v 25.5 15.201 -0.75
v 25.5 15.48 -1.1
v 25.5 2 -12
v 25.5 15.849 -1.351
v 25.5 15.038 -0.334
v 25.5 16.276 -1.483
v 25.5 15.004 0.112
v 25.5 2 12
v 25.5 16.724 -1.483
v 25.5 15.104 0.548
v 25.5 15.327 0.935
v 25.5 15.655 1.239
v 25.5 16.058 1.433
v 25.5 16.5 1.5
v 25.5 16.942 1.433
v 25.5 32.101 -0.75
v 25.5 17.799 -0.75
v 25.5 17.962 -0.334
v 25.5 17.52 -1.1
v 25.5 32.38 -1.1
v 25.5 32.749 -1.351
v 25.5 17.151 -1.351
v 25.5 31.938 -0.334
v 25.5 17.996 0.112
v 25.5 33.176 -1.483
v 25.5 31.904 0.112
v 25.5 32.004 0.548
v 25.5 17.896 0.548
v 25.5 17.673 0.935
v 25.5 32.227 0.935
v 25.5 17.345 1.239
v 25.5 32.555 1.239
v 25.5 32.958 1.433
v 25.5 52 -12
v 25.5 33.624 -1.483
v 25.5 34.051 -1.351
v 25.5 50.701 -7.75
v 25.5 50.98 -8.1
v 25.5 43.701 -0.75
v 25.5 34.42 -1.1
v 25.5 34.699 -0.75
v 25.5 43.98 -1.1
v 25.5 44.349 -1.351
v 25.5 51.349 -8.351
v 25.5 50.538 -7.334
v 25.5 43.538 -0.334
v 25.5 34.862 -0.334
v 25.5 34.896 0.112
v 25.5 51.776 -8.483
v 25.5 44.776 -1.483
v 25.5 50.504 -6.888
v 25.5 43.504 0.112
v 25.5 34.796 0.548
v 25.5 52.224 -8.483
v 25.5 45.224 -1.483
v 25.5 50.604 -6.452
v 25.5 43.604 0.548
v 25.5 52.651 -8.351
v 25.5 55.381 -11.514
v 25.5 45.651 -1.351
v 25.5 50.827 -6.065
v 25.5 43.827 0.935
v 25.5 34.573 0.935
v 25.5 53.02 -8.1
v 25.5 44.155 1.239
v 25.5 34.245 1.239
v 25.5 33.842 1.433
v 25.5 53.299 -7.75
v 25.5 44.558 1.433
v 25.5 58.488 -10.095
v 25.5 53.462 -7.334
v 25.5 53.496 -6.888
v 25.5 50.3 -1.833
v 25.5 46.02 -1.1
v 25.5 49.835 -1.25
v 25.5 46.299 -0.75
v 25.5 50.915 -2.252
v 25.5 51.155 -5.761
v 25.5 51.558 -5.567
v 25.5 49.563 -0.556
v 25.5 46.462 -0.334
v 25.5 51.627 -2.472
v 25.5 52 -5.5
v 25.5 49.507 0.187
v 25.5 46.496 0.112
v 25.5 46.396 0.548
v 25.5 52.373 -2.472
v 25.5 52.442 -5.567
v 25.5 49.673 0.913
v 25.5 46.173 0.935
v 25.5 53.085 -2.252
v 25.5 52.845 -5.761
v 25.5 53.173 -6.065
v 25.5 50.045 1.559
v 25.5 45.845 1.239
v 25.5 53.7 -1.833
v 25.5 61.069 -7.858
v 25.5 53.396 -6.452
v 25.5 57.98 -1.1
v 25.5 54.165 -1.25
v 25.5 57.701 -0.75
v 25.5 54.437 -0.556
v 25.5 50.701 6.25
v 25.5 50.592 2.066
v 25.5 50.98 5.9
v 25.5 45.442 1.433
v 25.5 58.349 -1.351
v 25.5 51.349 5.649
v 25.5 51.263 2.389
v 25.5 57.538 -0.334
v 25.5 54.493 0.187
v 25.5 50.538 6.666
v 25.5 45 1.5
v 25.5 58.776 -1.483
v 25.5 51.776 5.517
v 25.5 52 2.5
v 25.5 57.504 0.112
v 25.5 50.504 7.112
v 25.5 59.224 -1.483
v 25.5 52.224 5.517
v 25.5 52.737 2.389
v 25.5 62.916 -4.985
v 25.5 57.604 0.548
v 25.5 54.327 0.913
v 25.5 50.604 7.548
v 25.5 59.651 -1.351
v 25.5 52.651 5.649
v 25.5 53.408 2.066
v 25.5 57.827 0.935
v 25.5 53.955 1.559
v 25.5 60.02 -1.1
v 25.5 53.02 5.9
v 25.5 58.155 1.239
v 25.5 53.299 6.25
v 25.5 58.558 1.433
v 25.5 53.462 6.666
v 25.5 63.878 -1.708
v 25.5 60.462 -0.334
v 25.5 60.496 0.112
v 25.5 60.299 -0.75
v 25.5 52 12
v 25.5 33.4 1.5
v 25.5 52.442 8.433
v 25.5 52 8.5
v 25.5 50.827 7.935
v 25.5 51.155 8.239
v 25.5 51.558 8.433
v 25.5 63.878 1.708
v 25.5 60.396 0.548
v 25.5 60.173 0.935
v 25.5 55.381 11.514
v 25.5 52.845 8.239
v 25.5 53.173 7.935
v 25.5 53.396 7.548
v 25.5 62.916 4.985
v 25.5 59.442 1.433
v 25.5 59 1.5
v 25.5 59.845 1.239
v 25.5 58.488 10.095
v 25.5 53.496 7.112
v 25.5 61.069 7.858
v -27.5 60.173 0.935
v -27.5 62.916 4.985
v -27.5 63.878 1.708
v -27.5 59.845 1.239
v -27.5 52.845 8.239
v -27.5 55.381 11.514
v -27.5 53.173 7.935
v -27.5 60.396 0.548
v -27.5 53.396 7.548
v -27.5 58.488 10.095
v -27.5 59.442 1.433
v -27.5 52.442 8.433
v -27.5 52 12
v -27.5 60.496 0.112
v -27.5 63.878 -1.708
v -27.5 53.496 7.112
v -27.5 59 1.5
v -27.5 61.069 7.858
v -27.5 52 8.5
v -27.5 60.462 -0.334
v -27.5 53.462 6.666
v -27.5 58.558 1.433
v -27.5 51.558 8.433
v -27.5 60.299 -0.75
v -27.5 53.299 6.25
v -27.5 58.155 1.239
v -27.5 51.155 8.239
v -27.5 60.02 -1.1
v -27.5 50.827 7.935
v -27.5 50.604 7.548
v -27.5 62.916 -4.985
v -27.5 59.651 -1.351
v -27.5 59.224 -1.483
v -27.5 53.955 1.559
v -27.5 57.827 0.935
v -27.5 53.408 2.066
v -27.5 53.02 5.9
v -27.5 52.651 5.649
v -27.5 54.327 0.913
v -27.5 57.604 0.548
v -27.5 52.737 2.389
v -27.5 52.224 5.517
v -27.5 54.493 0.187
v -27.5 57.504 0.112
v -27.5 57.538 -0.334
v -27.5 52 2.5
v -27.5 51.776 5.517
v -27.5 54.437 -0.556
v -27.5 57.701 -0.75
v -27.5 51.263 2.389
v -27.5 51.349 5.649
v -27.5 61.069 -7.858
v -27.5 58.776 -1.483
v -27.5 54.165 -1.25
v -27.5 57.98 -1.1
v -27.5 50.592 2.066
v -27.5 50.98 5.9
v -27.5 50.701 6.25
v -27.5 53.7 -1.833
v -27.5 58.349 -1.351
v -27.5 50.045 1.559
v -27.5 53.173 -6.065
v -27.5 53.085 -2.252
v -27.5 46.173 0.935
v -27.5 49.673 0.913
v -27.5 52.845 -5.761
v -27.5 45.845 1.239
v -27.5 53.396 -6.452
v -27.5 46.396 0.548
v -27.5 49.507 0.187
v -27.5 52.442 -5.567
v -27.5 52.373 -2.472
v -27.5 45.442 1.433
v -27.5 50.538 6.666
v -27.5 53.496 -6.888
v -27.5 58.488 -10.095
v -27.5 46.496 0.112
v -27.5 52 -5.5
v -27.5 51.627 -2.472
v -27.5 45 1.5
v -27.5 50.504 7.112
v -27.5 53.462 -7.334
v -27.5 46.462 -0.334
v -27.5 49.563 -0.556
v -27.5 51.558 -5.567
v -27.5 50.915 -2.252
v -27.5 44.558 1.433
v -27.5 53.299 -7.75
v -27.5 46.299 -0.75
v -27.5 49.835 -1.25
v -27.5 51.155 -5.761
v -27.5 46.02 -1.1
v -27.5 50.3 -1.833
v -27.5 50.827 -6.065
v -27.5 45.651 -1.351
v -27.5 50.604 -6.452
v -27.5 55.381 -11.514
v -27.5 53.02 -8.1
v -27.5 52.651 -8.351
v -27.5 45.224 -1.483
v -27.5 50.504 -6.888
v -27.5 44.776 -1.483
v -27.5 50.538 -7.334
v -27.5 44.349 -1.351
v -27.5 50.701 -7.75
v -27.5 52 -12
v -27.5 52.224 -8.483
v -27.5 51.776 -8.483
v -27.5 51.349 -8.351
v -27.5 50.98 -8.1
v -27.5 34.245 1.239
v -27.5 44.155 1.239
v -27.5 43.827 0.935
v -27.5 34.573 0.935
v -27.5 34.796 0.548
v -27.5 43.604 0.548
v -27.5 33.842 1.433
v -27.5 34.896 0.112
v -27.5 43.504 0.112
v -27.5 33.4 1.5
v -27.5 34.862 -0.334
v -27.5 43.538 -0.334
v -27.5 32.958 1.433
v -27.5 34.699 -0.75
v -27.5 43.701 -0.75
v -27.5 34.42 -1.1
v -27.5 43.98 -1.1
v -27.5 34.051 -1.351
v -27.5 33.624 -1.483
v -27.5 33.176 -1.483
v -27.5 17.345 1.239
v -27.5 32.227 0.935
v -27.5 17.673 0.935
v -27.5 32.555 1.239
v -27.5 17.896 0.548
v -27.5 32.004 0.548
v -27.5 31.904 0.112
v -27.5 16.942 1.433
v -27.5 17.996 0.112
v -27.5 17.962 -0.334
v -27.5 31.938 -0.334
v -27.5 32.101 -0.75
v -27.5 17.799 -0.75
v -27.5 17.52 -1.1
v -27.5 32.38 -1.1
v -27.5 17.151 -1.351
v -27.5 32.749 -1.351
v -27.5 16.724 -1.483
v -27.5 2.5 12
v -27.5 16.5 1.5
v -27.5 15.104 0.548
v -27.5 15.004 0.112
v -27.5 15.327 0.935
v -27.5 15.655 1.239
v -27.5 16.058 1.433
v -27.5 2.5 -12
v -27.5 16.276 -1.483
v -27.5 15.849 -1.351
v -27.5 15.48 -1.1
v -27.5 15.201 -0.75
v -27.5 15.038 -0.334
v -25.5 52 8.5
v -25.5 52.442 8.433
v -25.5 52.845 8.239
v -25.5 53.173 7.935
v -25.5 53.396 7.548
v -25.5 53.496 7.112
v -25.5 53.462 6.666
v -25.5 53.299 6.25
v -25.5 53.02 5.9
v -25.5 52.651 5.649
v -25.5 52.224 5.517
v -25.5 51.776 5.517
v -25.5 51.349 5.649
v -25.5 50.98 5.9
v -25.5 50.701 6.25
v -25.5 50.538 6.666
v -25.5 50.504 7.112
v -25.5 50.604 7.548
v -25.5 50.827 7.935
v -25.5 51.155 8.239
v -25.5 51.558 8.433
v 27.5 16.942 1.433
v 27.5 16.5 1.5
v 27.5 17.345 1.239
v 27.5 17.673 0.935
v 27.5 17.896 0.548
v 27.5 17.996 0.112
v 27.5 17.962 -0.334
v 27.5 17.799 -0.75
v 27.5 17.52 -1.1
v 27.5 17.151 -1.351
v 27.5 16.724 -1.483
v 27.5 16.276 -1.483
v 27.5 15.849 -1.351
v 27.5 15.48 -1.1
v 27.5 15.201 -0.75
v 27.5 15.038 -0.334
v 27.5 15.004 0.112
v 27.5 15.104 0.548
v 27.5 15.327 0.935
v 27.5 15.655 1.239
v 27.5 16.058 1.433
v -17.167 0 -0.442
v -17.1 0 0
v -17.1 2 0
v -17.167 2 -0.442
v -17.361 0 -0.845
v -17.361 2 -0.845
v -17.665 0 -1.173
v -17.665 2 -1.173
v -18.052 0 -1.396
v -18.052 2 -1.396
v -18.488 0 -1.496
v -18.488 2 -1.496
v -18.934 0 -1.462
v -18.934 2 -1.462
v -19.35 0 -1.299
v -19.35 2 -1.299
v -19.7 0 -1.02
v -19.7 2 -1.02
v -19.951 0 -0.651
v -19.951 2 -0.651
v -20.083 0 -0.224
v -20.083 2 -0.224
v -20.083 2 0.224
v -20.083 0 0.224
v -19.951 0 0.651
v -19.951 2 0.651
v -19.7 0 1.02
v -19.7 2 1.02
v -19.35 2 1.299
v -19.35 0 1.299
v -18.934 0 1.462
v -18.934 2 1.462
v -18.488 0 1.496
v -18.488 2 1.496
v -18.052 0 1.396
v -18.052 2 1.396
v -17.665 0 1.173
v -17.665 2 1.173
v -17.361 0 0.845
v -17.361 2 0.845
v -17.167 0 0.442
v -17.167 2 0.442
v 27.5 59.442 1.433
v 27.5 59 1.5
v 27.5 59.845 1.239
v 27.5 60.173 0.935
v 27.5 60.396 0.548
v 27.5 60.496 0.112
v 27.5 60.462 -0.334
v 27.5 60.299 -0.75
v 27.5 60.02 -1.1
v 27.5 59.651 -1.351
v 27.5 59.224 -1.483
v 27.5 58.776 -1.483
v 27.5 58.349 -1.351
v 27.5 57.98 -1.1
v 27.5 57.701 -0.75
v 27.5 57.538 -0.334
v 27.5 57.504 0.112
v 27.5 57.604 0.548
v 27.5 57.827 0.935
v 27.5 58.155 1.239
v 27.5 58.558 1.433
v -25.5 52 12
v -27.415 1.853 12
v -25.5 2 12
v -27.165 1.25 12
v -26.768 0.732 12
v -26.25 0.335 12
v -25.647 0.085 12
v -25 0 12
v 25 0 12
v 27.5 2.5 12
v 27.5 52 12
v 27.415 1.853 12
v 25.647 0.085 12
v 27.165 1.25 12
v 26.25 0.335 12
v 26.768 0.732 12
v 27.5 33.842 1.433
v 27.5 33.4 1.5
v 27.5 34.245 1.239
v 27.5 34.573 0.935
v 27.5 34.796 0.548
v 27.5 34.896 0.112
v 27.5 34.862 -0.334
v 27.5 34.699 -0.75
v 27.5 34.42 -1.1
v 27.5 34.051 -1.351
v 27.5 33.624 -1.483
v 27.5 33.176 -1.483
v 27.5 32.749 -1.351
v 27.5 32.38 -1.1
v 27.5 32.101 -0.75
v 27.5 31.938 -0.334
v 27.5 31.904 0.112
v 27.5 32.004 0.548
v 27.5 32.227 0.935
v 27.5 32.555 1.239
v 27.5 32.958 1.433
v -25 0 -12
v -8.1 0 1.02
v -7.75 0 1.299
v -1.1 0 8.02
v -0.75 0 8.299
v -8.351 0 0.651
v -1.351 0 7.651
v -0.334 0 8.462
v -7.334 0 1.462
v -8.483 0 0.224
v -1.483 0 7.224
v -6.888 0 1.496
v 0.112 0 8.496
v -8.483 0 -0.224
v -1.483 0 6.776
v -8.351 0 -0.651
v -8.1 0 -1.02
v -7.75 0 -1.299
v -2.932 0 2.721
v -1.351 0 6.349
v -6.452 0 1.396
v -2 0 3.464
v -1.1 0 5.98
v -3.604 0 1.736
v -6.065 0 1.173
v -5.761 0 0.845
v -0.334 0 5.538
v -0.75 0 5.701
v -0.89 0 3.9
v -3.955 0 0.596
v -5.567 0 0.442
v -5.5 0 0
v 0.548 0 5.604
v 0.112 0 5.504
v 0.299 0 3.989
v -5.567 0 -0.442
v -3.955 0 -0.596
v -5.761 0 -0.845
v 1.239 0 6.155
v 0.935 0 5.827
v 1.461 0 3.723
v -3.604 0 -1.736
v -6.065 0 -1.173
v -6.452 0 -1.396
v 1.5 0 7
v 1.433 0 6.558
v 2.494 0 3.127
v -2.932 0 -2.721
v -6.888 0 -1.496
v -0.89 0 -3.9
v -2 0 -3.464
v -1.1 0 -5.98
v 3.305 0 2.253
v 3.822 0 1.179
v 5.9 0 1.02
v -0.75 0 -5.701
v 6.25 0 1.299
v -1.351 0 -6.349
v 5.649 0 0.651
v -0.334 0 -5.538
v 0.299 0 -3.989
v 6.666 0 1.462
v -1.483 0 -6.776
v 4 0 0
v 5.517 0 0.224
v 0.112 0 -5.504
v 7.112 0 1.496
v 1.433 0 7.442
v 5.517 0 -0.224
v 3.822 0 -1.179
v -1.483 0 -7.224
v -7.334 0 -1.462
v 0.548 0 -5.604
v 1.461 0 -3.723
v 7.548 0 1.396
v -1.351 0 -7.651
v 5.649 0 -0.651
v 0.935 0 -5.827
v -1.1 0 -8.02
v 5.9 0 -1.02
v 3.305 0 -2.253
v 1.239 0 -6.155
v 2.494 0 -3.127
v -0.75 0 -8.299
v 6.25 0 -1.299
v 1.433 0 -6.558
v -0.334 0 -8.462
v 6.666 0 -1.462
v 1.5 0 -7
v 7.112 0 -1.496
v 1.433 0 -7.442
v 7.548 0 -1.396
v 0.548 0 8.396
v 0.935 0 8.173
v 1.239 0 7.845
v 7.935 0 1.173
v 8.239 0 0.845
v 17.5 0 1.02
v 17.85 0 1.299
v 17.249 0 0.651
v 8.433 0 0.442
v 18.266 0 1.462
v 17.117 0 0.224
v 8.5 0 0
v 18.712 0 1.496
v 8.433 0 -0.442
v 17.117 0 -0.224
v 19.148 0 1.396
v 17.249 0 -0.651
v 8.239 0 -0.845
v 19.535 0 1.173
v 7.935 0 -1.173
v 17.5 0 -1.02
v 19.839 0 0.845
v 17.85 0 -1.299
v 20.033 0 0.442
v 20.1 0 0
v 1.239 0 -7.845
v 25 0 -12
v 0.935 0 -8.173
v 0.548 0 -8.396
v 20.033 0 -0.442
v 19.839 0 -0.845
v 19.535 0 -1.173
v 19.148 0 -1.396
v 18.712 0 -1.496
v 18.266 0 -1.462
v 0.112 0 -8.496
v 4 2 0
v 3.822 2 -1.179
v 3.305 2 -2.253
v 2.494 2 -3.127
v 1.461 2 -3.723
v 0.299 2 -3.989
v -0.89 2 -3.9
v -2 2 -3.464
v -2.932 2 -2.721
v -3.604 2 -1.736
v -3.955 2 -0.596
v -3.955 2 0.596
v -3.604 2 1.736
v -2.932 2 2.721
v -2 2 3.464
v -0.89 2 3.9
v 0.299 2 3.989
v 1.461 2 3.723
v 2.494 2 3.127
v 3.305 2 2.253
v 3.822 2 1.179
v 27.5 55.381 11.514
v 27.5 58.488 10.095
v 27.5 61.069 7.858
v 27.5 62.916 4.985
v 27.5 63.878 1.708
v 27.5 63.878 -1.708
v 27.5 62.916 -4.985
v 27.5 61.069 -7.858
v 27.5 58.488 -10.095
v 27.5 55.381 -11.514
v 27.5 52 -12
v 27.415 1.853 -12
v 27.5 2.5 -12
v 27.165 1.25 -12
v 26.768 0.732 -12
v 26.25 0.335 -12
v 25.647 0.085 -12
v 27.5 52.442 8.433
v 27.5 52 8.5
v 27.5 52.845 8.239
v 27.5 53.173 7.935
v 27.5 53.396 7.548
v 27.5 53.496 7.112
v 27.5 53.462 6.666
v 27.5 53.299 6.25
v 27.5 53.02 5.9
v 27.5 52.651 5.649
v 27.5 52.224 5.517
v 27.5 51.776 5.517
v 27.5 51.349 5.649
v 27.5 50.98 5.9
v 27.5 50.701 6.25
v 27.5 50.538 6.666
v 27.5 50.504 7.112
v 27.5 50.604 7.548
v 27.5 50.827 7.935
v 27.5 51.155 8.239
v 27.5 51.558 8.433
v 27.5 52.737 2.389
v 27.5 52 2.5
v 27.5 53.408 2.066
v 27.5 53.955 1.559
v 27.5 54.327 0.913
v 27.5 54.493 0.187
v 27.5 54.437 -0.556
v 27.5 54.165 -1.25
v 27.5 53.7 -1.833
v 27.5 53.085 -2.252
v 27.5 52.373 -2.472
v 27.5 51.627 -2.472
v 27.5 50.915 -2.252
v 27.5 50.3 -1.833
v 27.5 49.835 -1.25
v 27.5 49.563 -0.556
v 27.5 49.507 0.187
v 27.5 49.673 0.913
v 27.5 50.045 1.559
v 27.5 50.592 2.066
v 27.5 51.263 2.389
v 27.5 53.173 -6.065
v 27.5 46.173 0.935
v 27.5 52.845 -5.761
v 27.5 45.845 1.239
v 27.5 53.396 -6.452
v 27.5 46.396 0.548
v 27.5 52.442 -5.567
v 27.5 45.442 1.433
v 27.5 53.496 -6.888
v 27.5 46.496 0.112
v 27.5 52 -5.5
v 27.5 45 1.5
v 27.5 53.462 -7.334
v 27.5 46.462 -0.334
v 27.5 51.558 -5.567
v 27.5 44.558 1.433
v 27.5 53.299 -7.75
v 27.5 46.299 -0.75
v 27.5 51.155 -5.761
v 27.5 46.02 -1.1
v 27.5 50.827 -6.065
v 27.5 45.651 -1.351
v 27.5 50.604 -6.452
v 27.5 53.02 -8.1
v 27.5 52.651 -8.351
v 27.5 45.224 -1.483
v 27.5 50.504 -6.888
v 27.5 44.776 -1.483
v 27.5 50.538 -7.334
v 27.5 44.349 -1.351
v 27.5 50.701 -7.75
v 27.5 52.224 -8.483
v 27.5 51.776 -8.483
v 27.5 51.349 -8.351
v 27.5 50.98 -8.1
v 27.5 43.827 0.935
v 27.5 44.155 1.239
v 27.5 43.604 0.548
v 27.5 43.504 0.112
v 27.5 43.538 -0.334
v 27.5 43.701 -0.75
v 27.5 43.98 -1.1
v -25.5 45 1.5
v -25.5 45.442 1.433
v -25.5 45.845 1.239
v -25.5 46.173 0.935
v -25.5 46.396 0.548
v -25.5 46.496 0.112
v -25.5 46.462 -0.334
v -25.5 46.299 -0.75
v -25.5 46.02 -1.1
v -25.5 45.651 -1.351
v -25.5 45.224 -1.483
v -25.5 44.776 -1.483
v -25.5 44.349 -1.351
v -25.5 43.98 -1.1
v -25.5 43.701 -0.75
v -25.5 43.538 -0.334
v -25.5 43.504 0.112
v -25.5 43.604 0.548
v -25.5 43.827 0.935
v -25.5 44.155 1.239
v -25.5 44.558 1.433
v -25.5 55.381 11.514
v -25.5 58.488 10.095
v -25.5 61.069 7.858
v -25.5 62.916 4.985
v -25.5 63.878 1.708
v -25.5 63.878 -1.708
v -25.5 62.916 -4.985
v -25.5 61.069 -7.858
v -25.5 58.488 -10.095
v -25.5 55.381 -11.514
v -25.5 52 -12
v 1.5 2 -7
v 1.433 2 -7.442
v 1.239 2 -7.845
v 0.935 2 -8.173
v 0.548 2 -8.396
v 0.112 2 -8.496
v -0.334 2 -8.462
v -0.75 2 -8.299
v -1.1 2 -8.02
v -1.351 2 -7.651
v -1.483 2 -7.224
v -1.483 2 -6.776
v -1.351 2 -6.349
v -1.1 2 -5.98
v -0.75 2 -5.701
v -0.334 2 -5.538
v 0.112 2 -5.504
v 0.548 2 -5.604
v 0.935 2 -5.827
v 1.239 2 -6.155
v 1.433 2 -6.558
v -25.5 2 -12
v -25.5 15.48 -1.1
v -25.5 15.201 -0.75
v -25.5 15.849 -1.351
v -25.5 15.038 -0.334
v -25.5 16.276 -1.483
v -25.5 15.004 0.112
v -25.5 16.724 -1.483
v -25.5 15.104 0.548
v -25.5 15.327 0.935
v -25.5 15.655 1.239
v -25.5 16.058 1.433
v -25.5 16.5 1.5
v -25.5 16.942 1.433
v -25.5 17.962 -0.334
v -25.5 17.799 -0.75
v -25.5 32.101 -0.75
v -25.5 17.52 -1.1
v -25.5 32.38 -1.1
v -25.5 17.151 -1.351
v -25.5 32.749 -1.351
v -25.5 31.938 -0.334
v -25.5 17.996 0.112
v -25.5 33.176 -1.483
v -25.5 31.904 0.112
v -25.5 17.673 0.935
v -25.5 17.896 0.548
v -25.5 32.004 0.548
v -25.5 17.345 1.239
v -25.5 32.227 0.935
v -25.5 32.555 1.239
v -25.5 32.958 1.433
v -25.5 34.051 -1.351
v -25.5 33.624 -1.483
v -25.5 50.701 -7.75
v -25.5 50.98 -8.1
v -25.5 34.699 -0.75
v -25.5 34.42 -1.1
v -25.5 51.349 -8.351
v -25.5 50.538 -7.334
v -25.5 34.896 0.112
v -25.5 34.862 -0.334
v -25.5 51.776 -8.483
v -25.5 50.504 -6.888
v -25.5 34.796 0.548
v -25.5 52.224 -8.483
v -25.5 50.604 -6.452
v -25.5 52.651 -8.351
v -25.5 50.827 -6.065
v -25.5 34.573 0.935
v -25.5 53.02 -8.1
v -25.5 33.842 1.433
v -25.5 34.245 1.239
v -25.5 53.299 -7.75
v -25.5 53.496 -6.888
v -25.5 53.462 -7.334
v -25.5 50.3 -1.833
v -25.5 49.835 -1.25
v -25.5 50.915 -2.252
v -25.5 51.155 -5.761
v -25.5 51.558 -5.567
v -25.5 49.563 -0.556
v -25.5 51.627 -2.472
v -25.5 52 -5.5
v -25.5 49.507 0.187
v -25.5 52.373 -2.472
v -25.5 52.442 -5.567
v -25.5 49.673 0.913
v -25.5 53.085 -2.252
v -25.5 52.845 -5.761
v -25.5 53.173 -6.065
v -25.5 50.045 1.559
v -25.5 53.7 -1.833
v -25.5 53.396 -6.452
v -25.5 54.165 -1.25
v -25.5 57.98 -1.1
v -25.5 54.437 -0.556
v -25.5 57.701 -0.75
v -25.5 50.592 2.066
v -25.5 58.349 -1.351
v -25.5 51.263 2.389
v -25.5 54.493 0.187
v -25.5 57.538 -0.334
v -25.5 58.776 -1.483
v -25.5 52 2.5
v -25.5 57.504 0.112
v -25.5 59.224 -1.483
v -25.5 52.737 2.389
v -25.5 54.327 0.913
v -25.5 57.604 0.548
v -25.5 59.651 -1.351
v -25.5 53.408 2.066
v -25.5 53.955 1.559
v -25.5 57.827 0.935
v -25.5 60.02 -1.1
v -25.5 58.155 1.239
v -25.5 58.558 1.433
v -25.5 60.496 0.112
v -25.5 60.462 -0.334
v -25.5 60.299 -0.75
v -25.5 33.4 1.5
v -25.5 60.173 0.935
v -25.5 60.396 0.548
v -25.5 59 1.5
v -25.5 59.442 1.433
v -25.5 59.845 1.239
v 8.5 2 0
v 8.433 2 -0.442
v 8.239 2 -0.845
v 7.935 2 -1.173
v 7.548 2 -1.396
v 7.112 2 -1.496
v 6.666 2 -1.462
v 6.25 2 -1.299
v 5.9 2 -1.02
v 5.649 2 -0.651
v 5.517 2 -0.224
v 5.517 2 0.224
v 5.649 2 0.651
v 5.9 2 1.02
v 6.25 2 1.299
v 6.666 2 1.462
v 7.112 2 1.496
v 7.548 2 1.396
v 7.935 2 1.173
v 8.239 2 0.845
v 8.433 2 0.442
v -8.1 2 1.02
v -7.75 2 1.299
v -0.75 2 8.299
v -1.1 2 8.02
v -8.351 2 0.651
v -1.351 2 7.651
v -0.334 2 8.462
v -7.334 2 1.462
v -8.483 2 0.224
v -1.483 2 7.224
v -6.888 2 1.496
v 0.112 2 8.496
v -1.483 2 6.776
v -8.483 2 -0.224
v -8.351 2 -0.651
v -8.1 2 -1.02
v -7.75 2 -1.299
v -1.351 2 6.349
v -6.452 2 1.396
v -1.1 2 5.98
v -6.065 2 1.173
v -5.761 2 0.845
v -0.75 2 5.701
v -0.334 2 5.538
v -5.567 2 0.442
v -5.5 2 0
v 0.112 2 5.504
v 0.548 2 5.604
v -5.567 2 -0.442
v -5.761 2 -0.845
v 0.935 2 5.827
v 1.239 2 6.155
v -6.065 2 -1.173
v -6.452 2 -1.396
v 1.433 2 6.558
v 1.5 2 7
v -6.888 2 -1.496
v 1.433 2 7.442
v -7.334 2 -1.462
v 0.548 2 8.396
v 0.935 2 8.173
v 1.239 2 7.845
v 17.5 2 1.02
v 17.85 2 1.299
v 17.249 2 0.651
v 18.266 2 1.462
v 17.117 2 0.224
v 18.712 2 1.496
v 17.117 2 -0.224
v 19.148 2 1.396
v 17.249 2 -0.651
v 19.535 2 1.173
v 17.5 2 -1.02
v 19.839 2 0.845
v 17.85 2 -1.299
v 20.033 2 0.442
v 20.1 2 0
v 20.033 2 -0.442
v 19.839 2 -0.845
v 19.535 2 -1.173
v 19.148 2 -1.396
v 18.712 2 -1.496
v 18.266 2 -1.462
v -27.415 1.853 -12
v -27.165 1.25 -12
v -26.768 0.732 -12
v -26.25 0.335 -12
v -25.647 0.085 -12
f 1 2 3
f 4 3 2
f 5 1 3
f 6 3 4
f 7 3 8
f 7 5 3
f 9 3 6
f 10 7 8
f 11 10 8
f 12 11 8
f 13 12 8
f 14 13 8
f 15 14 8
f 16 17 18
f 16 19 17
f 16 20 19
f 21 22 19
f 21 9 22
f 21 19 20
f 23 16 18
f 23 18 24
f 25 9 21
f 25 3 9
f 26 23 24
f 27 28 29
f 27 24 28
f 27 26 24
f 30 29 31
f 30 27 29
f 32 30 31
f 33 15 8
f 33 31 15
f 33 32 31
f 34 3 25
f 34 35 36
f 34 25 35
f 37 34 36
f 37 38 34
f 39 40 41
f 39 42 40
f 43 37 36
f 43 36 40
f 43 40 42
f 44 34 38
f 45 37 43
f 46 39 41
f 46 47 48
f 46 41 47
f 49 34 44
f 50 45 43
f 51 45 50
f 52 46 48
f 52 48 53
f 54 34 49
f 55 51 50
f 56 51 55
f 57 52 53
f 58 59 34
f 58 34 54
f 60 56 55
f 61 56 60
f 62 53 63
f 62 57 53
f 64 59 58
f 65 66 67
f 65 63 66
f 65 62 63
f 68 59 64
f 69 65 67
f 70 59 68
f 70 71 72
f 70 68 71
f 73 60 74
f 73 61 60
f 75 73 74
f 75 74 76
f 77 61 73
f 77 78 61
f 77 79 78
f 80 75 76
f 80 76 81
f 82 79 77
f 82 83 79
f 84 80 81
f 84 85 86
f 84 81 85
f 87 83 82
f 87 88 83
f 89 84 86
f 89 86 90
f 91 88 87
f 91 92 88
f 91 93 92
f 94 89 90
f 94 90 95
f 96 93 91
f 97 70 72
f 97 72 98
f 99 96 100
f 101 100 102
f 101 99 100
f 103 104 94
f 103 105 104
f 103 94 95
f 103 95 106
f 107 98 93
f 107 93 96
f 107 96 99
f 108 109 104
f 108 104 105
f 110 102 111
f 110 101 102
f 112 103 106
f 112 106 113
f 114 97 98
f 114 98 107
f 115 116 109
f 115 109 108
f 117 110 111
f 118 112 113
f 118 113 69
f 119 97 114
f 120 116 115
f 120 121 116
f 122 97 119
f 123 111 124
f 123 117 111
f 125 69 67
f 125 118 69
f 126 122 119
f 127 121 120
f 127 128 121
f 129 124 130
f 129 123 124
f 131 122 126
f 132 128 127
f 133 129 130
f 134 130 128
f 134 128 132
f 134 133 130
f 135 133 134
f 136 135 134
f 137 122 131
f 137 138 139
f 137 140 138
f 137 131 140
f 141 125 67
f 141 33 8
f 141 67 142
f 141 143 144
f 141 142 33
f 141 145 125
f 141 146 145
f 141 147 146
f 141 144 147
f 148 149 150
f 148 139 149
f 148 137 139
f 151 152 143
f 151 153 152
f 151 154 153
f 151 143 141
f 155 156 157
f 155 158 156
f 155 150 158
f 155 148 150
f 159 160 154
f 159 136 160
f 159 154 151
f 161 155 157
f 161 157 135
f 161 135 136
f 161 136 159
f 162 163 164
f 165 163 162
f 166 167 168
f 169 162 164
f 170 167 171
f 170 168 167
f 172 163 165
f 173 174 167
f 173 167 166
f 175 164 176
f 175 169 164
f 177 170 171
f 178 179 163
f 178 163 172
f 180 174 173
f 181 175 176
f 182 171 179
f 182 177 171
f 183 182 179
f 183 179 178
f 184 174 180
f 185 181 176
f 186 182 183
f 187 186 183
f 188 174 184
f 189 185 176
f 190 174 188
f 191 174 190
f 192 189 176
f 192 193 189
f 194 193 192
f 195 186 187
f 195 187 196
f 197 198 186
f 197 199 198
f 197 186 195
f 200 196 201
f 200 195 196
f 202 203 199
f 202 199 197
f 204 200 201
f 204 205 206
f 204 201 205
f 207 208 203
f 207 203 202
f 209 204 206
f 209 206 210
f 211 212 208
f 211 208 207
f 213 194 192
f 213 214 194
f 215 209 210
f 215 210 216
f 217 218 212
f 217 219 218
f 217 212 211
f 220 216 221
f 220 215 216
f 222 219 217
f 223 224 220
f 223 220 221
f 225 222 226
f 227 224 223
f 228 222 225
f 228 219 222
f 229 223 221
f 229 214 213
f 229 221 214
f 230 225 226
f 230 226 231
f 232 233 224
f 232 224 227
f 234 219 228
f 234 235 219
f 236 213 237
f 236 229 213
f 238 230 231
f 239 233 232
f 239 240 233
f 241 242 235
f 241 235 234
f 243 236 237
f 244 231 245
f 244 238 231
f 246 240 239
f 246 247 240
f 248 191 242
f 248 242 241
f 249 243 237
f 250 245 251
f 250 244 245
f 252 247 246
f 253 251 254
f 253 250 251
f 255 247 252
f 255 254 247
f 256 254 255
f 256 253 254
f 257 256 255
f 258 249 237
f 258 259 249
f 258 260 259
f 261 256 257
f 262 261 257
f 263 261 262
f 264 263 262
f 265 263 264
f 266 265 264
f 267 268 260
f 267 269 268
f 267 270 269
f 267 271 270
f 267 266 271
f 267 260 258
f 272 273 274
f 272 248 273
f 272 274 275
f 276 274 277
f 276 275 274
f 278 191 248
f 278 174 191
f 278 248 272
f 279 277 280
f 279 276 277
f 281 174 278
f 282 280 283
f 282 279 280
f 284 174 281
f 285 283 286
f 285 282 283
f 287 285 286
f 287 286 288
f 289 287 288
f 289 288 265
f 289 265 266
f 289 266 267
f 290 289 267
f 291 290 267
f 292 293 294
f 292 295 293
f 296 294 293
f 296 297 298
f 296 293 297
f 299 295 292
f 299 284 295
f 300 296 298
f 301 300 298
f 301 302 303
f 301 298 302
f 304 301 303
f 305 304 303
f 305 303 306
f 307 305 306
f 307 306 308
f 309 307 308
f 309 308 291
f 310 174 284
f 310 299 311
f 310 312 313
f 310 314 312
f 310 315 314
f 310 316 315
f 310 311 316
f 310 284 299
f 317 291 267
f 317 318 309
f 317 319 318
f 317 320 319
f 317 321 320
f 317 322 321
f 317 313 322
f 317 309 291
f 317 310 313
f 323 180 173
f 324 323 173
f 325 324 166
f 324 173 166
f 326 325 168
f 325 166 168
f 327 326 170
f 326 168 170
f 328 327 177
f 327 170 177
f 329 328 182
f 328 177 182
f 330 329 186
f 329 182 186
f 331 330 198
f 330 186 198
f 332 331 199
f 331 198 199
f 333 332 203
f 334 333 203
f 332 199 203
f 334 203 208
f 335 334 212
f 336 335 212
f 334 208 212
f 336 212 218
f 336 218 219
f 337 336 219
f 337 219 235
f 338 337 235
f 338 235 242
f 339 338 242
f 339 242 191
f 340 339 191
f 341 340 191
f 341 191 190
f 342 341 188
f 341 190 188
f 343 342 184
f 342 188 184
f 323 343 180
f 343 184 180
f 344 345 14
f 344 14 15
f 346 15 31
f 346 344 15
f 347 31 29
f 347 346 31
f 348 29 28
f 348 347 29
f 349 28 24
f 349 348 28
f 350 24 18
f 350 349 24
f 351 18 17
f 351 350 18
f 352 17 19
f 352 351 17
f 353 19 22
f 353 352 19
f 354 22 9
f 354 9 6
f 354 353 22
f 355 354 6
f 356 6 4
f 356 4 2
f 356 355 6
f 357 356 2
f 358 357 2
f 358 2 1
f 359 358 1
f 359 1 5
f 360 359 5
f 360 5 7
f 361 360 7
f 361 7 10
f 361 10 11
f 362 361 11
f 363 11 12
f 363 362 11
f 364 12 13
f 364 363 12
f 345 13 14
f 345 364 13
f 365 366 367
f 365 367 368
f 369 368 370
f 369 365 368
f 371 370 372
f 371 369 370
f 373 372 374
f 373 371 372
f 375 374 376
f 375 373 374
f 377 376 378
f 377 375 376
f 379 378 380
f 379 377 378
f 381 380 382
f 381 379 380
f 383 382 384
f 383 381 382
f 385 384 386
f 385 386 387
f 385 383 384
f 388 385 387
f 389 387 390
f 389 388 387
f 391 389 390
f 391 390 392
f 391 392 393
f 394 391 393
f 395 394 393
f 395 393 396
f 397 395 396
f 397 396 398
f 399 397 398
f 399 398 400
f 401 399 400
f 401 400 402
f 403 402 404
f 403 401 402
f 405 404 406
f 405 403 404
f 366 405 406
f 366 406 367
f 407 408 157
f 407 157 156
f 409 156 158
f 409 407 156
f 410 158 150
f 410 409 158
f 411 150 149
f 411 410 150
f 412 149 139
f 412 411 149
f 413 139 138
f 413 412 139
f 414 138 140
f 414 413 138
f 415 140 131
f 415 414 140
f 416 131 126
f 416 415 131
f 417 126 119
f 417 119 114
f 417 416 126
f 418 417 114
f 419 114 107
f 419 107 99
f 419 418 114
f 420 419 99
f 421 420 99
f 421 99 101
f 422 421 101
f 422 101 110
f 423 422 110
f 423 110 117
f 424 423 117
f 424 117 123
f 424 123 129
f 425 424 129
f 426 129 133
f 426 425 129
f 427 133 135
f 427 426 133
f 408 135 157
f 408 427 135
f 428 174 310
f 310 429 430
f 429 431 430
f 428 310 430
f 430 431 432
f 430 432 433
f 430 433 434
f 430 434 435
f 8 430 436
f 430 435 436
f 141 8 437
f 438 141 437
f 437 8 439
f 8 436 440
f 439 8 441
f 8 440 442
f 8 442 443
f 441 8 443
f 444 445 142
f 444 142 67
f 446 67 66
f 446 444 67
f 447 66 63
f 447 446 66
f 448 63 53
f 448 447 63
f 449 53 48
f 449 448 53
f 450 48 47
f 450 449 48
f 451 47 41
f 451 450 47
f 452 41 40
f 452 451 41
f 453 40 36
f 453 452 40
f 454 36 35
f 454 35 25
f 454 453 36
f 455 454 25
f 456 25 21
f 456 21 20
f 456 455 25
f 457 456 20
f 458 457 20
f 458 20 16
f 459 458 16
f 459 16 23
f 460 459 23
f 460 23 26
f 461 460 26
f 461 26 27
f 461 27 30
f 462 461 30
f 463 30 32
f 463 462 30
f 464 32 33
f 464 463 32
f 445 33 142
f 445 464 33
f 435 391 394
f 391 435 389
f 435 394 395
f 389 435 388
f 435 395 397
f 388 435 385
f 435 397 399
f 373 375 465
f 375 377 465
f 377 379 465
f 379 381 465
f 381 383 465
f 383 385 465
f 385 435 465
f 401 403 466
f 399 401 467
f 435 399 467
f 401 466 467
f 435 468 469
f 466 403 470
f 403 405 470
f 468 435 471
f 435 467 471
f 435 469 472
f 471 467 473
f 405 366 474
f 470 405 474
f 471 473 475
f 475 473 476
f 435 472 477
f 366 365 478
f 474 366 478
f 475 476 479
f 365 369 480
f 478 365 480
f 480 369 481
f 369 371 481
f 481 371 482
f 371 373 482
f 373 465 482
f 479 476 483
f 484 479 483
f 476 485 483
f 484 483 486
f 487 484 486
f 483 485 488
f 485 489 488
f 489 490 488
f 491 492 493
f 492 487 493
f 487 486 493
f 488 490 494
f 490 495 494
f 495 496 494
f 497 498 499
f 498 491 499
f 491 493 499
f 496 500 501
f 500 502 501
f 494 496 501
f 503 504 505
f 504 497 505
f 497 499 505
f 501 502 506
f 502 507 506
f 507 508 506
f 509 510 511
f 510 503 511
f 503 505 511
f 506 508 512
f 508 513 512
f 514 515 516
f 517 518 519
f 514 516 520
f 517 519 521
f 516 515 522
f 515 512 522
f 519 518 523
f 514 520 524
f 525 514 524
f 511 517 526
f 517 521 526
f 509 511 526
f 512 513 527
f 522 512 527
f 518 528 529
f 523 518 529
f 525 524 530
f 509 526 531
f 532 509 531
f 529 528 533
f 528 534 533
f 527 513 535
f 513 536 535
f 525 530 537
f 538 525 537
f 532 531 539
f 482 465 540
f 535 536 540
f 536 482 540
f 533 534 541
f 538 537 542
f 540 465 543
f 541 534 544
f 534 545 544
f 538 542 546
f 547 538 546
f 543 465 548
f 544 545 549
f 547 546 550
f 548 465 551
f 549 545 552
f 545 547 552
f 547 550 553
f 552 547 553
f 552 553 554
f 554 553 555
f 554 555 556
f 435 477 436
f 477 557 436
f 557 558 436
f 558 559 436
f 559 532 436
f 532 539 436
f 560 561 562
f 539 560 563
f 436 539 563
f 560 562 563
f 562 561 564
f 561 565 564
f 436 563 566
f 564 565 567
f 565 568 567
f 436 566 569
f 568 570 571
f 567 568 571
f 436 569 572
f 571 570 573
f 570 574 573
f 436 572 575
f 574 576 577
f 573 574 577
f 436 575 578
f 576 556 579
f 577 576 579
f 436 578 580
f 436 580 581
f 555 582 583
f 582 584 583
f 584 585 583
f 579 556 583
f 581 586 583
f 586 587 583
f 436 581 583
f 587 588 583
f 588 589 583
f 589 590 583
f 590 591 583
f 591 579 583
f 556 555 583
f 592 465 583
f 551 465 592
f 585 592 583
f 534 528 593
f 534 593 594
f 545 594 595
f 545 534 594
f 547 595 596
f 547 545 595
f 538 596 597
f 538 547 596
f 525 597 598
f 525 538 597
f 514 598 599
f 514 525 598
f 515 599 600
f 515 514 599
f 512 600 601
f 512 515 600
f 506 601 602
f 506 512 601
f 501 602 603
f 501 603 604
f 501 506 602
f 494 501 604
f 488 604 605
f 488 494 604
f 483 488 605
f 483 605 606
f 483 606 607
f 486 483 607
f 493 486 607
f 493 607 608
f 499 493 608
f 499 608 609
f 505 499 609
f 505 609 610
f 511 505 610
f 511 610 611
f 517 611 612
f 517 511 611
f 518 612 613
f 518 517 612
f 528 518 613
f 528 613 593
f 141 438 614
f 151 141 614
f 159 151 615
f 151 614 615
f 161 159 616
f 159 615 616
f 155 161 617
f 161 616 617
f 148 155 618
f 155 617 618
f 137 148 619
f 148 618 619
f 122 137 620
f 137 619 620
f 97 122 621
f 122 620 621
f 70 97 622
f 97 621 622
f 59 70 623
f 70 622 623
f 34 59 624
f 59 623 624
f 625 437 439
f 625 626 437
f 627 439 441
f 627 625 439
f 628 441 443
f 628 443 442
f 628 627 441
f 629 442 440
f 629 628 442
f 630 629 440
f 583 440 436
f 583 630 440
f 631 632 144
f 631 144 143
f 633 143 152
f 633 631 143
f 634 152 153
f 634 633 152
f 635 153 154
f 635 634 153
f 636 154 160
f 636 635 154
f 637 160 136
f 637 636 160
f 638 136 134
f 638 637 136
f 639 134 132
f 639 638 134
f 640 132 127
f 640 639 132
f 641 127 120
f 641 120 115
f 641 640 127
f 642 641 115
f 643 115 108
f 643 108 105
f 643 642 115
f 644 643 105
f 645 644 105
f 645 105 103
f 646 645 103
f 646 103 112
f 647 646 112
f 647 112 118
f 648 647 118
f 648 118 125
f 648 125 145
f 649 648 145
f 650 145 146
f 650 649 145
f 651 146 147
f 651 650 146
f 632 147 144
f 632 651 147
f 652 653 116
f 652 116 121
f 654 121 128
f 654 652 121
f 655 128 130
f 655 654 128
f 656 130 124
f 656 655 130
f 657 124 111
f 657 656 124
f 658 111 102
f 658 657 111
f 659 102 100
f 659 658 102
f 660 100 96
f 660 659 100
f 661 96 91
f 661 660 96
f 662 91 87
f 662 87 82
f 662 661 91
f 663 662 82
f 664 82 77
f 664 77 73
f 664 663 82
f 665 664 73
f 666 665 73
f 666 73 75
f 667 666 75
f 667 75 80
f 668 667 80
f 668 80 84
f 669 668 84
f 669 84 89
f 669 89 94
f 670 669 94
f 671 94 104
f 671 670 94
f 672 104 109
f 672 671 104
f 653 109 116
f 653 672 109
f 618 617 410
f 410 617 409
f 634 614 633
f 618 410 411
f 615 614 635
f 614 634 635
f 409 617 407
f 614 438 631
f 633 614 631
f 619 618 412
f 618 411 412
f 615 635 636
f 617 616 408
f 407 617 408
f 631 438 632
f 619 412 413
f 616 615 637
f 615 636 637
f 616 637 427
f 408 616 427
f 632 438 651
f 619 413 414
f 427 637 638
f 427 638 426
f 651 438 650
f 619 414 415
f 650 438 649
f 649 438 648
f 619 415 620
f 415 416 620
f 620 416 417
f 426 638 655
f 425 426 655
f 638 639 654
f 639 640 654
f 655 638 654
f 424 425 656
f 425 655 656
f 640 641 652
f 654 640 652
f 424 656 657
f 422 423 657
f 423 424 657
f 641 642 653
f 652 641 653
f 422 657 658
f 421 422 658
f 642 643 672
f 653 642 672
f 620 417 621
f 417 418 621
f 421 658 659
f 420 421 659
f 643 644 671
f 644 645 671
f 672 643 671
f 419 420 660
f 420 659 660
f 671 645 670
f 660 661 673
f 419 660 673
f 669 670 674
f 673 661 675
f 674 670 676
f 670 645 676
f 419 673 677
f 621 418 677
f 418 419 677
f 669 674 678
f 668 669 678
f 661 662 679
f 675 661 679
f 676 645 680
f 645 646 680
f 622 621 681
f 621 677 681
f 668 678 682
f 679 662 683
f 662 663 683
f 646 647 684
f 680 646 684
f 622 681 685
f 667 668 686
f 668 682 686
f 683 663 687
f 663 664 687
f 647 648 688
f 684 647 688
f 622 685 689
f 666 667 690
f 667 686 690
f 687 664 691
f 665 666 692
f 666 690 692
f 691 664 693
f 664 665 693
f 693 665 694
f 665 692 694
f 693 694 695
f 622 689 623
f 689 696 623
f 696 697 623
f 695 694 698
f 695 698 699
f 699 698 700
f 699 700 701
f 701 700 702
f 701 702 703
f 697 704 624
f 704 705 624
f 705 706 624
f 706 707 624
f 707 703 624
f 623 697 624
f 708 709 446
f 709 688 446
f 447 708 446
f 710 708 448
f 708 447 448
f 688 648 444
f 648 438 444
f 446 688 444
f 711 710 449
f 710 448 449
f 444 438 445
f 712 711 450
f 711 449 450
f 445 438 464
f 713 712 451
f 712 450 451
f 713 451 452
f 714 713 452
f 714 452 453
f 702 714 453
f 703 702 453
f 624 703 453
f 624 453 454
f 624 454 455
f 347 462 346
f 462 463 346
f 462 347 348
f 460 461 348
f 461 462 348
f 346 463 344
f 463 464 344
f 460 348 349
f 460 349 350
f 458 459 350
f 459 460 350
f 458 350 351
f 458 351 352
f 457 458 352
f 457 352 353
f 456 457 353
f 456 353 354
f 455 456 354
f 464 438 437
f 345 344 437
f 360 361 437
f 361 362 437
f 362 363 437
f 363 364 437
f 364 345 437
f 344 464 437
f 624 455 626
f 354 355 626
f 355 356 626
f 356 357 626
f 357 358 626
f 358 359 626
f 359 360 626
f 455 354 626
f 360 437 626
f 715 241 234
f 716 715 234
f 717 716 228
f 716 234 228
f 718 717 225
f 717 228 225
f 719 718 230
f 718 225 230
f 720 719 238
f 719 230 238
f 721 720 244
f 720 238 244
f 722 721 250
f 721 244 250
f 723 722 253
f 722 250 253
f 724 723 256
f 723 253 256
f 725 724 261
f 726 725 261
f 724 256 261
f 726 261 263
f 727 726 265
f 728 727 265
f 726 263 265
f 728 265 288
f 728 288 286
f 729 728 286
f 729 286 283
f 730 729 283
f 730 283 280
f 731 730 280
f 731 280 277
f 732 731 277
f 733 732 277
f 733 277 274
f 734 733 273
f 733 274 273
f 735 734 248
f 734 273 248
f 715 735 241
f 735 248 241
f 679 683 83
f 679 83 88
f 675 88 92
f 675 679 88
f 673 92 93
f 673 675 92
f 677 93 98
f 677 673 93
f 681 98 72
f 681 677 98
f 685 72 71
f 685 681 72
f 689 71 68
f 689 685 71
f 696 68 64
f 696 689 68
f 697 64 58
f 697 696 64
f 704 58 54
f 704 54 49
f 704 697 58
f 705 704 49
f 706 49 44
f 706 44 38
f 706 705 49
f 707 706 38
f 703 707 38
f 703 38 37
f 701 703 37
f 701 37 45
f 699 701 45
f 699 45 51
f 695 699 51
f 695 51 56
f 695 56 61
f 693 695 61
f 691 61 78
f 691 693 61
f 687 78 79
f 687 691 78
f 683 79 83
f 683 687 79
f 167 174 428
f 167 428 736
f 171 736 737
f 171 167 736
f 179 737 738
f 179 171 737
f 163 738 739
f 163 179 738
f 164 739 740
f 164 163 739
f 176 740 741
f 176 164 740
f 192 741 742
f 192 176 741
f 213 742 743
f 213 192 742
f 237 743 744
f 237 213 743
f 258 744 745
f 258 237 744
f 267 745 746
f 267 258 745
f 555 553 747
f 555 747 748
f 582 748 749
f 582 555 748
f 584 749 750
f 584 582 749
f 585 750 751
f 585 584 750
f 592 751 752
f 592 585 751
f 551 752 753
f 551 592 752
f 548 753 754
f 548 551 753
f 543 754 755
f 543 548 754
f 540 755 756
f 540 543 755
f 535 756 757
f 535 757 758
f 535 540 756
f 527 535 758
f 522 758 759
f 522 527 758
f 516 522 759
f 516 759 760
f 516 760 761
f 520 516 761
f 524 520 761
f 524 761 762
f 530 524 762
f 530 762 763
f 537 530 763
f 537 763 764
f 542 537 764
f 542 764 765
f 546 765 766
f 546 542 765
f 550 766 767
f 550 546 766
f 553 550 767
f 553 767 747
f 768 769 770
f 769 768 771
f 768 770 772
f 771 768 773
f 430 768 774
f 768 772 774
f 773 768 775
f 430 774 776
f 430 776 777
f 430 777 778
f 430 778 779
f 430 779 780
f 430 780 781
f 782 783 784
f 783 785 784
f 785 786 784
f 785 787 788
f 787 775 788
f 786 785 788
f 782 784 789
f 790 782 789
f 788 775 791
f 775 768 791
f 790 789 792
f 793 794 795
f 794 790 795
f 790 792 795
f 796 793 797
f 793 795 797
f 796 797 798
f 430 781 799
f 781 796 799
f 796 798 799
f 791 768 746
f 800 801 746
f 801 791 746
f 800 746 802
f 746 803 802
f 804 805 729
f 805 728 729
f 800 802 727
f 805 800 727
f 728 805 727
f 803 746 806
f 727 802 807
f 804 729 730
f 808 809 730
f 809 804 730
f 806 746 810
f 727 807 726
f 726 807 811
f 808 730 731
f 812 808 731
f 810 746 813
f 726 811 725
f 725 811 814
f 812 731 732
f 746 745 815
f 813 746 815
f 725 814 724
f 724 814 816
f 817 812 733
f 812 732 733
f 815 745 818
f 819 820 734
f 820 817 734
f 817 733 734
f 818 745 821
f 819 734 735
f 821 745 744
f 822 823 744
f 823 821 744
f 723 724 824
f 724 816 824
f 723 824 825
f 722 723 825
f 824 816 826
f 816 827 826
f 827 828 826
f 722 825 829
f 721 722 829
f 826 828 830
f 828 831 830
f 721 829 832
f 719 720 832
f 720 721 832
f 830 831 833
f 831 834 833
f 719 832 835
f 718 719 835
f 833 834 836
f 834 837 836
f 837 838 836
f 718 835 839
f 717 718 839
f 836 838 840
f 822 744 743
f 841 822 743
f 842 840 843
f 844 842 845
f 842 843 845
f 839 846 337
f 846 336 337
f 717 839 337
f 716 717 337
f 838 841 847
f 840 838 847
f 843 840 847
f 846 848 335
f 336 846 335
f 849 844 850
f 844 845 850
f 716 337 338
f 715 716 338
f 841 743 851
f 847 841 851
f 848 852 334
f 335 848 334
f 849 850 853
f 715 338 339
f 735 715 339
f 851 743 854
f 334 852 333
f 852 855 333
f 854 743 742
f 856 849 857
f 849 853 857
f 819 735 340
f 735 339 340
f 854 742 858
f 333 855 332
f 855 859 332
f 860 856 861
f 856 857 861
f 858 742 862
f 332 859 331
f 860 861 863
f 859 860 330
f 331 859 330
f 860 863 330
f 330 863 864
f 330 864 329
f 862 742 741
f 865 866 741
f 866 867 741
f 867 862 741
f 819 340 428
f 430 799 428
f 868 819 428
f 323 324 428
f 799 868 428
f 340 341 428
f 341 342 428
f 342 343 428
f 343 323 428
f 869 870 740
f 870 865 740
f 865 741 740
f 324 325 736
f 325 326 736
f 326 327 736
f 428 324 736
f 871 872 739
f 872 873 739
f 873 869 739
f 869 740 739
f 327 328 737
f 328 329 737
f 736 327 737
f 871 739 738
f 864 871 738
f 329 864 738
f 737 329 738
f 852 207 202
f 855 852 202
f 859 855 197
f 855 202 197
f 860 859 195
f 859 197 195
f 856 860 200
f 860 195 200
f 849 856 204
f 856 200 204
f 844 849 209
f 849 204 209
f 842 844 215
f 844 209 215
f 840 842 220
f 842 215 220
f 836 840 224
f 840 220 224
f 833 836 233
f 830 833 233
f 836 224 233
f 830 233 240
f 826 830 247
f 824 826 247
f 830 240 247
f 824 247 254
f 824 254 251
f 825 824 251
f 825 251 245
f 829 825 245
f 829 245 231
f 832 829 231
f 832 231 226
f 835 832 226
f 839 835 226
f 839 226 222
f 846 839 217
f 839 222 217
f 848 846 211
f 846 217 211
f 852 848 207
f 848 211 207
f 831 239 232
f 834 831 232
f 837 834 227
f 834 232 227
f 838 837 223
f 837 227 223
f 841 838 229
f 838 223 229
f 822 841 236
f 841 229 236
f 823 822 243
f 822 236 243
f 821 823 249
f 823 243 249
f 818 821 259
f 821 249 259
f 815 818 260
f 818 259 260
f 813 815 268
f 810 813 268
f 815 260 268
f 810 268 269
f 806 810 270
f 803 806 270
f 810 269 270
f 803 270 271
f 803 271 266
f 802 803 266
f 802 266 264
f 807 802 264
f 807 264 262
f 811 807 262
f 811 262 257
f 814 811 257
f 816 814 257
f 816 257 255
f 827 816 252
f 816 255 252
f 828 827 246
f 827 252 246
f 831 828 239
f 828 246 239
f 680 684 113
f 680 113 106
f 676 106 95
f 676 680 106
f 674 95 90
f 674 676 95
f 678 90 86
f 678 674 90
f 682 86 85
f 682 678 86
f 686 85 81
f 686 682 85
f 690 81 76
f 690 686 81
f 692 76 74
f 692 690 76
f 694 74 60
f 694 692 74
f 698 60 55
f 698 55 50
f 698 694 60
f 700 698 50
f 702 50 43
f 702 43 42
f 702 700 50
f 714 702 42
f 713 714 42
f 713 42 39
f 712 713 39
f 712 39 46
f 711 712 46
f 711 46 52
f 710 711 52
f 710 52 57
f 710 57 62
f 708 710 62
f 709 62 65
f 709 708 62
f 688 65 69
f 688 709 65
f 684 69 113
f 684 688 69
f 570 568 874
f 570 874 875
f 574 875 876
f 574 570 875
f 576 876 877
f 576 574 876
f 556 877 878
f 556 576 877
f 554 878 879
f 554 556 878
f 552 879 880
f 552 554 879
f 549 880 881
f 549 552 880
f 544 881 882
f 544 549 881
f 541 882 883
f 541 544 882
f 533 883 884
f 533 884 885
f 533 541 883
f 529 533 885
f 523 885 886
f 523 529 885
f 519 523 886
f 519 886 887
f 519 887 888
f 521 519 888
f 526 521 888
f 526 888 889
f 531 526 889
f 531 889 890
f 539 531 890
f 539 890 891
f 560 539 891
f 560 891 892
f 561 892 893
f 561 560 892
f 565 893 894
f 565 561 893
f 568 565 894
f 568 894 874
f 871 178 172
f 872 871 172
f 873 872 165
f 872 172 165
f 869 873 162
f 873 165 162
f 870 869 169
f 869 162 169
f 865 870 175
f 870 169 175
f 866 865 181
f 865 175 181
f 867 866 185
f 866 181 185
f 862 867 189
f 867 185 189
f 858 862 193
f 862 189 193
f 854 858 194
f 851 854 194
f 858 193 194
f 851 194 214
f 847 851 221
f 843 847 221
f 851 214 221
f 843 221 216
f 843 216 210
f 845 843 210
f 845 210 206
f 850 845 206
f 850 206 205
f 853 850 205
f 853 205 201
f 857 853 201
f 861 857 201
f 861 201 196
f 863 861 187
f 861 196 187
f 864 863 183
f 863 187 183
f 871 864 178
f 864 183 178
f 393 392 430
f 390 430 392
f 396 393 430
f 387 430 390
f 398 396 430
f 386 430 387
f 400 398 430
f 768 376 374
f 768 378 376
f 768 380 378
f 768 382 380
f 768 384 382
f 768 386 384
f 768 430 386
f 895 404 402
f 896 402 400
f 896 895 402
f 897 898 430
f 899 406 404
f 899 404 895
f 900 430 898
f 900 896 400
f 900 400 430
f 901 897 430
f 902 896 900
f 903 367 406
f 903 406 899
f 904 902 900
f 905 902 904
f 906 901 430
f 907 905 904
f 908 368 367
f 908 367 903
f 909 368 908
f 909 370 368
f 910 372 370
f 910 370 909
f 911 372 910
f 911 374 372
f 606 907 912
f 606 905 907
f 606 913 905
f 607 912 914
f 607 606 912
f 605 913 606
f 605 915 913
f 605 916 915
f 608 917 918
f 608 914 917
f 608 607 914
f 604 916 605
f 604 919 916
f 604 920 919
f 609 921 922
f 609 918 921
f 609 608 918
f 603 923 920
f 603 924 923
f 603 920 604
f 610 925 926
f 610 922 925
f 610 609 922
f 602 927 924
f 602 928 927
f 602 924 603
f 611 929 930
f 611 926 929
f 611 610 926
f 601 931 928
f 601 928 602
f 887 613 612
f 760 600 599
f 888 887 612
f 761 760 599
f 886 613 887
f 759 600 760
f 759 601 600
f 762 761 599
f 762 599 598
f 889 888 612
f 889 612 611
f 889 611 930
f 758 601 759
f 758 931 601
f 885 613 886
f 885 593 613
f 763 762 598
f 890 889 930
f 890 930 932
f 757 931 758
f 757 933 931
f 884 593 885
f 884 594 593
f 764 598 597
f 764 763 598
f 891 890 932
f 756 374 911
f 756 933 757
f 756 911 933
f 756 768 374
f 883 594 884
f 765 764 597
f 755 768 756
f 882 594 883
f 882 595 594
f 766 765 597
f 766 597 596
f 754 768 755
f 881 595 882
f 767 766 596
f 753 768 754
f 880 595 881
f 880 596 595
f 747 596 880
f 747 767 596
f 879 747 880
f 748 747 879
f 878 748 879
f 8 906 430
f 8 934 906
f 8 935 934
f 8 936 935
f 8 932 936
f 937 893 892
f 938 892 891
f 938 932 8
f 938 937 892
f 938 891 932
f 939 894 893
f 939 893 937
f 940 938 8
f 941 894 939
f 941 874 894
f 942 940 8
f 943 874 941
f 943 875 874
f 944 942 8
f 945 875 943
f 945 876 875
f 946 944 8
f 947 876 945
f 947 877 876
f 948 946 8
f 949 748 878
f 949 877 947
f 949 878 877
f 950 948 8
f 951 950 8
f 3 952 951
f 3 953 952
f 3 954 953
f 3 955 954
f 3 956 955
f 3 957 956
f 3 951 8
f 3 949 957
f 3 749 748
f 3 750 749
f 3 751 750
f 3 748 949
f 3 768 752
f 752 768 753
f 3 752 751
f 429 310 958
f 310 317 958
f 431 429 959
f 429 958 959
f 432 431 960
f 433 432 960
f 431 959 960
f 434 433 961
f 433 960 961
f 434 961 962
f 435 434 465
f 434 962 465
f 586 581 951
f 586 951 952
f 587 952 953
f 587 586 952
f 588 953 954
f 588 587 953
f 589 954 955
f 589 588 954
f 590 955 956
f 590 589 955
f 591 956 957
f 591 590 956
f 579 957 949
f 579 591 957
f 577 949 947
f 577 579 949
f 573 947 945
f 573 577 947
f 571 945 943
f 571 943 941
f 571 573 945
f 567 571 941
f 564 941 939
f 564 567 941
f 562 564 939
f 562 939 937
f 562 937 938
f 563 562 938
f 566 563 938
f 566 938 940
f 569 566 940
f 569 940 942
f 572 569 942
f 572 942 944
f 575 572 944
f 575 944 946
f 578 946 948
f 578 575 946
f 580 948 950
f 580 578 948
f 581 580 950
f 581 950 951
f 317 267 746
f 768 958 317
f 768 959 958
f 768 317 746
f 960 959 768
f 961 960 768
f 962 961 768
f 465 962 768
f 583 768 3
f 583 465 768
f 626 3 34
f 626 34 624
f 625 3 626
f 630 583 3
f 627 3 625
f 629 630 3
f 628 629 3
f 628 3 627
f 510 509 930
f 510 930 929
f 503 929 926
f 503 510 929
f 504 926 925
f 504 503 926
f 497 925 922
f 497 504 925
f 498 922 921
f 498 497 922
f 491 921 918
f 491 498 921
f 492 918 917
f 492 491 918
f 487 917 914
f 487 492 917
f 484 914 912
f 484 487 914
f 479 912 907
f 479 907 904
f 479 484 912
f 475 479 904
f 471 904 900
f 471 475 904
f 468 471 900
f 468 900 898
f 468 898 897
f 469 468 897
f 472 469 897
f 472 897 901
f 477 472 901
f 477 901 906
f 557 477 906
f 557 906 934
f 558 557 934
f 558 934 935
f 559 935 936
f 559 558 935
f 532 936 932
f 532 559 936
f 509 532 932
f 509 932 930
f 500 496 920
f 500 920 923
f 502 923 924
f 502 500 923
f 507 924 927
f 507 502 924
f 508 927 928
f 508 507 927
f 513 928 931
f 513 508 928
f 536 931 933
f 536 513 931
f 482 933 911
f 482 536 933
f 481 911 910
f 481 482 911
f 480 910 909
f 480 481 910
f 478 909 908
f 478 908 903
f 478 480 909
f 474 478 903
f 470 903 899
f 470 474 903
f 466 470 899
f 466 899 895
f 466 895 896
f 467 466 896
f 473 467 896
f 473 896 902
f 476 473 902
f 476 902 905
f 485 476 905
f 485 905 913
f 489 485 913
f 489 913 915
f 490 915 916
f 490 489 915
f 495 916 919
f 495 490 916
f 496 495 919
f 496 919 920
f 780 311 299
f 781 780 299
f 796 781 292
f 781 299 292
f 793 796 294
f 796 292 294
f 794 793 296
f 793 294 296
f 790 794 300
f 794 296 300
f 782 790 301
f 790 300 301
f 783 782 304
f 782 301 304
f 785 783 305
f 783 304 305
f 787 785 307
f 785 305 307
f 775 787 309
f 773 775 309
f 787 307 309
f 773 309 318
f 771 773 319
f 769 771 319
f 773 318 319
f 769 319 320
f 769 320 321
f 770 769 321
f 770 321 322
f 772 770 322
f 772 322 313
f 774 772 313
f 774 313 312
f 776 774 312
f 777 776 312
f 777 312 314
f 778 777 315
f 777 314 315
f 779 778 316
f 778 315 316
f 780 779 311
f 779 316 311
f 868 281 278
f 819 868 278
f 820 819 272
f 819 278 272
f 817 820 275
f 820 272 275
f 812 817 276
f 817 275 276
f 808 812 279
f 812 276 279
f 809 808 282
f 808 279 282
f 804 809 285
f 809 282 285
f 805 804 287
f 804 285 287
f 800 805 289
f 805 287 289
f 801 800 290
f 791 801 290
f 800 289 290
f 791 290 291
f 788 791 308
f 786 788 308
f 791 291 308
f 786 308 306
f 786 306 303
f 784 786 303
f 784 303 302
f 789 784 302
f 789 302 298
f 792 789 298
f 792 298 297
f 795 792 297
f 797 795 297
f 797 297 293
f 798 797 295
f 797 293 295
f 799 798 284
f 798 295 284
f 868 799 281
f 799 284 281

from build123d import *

# Parameters (mm, degrees)
SKETCH2_W           = 55
SKETCH2_H           = 24
SKETCH2_R           = 4
SKETCH2_R_2         = 1.5
BOSS_EXTRUDE1_DEPTH = 2
SKETCH5_R           = 2.5
SKETCH5_R_2         = 1.5
BOSS_EXTRUDE2_DEPTH = 2
FILLET1_R           = 2.5


with BuildPart() as part:
    # Sketch2 → Boss-Extrude1 (new body)
    with BuildSketch(Plane(origin=(0, 0, 0), x_dir=(1, 0, 0), z_dir=(0, 1, 0))):
        Rectangle(SKETCH2_W, SKETCH2_H)
        Circle(SKETCH2_R, mode=Mode.SUBTRACT)
        with Locations((0, 7)):
            Circle(SKETCH2_R_2, mode=Mode.SUBTRACT)
        with Locations((7, 0)):
            Circle(SKETCH2_R_2, mode=Mode.SUBTRACT)
        with Locations((0, -7)):
            Circle(SKETCH2_R_2, mode=Mode.SUBTRACT)
        with Locations((-7, 0)):
            Circle(SKETCH2_R_2, mode=Mode.SUBTRACT)
        with Locations((-18.6, 0)):
            Circle(SKETCH2_R_2, mode=Mode.SUBTRACT)
        with Locations((18.6, 0)):
            Circle(SKETCH2_R_2, mode=Mode.SUBTRACT)
    extrude(amount=BOSS_EXTRUDE1_DEPTH)

    # Sketch5 → Boss-Extrude2 (add)
    with BuildSketch(Plane.ZY.offset(27.5)):
        with BuildLine():
            Line((12, 0), (12, 52))
            ThreePointArc((12, 52), (0, 64), (-12, 52))
            Line((-12, 52), (-12, 0))
            Line((-12, 0), (12, 0))
        make_face()
        with Locations((0, 52)):
            Circle(SKETCH5_R, mode=Mode.SUBTRACT)
        with Locations((0, 59)):
            Circle(SKETCH5_R_2, mode=Mode.SUBTRACT)
        with Locations((7, 52)):
            Circle(SKETCH5_R_2, mode=Mode.SUBTRACT)
        with Locations((0, 45)):
            Circle(SKETCH5_R_2, mode=Mode.SUBTRACT)
        with Locations((-7, 52)):
            Circle(SKETCH5_R_2, mode=Mode.SUBTRACT)
        with Locations((0, 33.4)):
            Circle(SKETCH5_R_2, mode=Mode.SUBTRACT)
        with Locations((0, 16.5)):
            Circle(SKETCH5_R_2, mode=Mode.SUBTRACT)
    boss_extrude2 = extrude(amount=-BOSS_EXTRUDE2_DEPTH)

    # Mirror1: Boss-Extrude2 across plane
    add(boss_extrude2.mirror(Plane(origin=(0, 0, 0), x_dir=(0, 0, 1), z_dir=(1, 0, 0))))

    # Fillet1
    fillet1_edges = [part.edges().sort_by_distance(p)[0] for p in [
        (-27.5, 0, 0),
        (27.5, 0, 0),
    ]]
    fillet(fillet1_edges, radius=FILLET1_R)


solid = part.part
